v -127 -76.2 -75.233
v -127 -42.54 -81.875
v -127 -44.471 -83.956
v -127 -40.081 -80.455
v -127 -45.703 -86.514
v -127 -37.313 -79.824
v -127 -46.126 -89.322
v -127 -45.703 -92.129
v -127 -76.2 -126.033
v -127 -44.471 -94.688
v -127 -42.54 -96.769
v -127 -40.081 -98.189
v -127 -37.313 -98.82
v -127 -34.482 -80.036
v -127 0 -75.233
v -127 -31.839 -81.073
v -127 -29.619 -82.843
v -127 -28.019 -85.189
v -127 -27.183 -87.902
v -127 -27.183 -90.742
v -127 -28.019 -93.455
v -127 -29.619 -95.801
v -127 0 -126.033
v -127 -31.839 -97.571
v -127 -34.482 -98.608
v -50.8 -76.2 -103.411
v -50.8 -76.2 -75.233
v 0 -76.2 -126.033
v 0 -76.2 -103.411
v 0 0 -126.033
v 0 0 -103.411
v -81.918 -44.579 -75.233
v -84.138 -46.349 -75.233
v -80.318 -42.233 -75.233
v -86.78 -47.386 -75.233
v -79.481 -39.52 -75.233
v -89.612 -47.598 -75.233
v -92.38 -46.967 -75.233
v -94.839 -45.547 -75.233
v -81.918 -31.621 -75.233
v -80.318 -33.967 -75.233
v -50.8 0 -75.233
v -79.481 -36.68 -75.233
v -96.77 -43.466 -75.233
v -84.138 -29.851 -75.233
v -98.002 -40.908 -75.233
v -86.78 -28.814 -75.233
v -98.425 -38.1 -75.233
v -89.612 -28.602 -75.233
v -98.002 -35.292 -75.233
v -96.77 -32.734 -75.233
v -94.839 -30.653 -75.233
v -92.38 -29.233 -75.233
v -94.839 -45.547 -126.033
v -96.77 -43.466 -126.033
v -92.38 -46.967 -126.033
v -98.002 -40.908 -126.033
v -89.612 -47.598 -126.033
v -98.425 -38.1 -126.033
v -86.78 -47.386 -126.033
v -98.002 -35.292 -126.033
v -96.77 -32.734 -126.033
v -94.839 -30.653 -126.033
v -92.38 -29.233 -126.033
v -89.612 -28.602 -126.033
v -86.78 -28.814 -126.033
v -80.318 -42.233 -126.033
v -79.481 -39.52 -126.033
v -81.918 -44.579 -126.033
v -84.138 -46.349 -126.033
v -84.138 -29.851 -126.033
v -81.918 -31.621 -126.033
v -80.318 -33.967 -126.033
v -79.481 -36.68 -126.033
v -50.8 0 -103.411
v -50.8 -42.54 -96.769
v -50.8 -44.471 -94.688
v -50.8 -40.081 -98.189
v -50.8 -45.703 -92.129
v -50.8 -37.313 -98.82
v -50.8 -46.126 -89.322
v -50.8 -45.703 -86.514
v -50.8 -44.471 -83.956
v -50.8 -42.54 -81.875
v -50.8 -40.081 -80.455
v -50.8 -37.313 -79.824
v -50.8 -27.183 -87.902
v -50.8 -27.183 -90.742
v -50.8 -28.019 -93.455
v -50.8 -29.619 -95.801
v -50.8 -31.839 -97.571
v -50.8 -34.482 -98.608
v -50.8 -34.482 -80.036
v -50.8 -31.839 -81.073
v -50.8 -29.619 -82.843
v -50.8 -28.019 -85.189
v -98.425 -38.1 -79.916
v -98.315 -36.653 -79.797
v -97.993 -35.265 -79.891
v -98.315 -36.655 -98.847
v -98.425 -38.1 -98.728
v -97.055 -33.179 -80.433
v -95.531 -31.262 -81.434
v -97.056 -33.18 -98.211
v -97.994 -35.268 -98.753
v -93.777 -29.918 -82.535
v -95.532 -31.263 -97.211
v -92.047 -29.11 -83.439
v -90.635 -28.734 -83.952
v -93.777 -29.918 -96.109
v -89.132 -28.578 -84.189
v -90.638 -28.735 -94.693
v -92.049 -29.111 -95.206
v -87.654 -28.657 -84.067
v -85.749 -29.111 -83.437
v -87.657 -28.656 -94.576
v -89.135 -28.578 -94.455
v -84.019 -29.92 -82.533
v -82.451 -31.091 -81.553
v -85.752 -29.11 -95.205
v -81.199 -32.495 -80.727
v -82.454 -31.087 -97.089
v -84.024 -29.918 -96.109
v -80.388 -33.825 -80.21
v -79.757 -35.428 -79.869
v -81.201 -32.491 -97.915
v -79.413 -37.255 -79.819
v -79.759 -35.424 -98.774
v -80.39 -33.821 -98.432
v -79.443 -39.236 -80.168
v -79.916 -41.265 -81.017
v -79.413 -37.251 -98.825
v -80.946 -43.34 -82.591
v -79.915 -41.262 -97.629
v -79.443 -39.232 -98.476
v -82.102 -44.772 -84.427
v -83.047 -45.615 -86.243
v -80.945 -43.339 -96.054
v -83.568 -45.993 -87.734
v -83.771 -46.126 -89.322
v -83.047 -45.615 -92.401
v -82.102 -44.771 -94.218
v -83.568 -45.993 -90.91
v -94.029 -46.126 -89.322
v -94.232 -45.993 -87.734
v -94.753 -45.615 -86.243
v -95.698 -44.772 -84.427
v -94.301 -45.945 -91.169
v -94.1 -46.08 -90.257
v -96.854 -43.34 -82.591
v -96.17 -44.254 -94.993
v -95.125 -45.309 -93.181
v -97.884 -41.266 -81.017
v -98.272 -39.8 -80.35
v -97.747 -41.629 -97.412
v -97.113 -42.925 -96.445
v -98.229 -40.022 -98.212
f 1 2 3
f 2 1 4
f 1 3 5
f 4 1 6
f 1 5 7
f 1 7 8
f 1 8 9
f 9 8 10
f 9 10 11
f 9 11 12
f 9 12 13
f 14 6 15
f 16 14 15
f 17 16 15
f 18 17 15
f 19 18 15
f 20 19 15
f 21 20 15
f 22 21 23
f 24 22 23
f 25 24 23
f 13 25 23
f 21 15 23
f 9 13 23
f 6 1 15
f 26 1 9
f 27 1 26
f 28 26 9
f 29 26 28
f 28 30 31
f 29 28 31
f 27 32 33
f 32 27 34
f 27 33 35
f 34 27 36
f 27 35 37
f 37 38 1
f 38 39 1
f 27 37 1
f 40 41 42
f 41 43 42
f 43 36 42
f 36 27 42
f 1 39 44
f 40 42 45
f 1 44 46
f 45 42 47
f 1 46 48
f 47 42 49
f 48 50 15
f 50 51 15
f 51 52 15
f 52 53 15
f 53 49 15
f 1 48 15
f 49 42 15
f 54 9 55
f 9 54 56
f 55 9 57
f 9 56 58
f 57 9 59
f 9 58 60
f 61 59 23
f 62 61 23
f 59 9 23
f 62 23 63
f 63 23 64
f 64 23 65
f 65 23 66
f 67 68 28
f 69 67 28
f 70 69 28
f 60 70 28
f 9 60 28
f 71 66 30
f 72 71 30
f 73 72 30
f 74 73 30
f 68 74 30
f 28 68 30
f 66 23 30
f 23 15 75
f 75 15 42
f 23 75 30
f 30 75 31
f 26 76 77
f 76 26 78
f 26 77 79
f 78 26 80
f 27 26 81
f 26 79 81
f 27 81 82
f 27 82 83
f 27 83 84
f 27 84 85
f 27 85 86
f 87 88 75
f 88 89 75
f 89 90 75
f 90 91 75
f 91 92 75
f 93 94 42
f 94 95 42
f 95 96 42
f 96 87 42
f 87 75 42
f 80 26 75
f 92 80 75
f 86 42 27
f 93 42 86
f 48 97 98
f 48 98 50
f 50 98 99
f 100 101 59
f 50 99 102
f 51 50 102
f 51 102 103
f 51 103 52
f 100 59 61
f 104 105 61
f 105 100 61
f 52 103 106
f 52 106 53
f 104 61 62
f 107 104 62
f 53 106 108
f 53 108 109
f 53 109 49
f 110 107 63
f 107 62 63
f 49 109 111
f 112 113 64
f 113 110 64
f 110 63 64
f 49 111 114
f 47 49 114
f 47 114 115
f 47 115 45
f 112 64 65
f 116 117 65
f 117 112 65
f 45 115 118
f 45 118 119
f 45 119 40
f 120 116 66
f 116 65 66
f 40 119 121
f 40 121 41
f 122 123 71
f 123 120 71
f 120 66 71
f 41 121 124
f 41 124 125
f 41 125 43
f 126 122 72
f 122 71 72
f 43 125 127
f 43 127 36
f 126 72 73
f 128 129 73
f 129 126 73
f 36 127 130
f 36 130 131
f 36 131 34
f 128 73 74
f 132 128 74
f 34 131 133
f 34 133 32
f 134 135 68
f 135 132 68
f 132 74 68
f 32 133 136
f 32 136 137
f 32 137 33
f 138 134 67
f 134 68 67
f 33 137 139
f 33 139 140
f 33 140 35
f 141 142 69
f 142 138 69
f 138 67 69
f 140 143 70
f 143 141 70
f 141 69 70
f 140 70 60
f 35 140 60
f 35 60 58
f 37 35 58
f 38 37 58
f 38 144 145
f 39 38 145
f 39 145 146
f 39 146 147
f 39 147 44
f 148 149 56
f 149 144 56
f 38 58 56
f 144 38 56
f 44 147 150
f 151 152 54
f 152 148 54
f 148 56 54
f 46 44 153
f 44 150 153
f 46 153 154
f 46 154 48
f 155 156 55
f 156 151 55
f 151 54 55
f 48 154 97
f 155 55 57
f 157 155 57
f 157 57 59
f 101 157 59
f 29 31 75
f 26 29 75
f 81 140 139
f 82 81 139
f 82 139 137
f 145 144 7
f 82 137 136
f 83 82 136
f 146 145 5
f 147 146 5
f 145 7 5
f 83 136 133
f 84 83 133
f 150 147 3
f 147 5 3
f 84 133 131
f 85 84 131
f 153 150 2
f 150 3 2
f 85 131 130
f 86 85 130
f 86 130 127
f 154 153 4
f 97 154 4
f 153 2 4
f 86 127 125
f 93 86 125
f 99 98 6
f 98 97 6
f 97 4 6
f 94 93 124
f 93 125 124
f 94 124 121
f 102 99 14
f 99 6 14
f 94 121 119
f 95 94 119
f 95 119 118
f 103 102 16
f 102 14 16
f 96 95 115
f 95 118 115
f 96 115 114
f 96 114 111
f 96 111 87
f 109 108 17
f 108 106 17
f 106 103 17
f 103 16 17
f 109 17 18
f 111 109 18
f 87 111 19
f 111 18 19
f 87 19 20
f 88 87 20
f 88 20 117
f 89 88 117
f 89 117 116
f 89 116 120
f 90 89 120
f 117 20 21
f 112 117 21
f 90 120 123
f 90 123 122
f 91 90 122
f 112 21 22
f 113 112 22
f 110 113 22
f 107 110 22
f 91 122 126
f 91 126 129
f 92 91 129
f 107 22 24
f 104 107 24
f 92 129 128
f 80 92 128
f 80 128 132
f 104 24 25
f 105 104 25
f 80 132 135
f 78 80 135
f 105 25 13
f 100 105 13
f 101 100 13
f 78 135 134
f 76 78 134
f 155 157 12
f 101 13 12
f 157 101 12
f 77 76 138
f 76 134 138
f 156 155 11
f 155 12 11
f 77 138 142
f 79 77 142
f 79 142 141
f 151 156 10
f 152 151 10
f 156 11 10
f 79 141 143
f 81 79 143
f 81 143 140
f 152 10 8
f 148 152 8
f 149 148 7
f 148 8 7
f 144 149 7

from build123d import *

# Parameters (mm, degrees)
F1_DEPTH = 76.2
F3_D     = 19.05
F5_D     = 19.05


with BuildPart() as f1:
    # F0 (on Front) → F1 (new body)
    with BuildSketch(Plane.XZ):
        Polygon((-50.8, -75.233199), (-127, -75.233199), (-127, -126.033199), (0, -126.033199), (0, -103.410661), (-50.8, -103.410661), align=None)
    extrude(amount=F1_DEPTH)

    # F3 (through all)
    with Locations(Plane.YZ.offset(-50.8)):
        with Locations((-36.601152, -89.32193)):
            Hole(F3_D / 2)

    # F5 (through all)
    with Locations(Plane.XY.offset(-75.233199)):
        with Locations((-88.9, -38.1)):
            Hole(F5_D / 2)


solid = f1.part
